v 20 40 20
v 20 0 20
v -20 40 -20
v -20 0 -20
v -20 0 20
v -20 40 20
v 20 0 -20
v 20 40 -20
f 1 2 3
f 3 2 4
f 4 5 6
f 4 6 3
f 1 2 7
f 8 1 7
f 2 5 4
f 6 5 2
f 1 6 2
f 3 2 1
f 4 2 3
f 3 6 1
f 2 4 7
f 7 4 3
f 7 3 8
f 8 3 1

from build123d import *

# Parameters (mm, degrees)
SKETCH1_W           = 40
SKETCH1_H           = 40
BOSS_EXTRUDE1_DEPTH = 40


with BuildPart() as part:
    # Sketch1 → Boss-Extrude1 (new body)
    with BuildSketch(Plane(origin=(0, 0, 0), x_dir=(1, 0, 0), z_dir=(0, 1, 0))):
        Rectangle(SKETCH1_W, SKETCH1_H)
    extrude(amount=BOSS_EXTRUDE1_DEPTH)


with BuildPart() as body_2:
    # Split1: the piece on the far side of the plane
    add(part.part)
    split(bisect_by=Plane(origin=(0, 0, 0), x_dir=(-0.7071067811865475, 0, -0.7071067811865477), z_dir=(-0.7071067811865477, 0, 0.7071067811865475)), keep=Keep.BOTTOM)


with BuildPart() as part_1:
    add(part.part)

    # Split1
    split(bisect_by=Plane(origin=(0, 0, 0), x_dir=(-0.7071067811865475, 0, -0.7071067811865477), z_dir=(-0.7071067811865477, 0, 0.7071067811865475)), keep=Keep.TOP)


solid = Compound([body_2.part, part_1.part])
